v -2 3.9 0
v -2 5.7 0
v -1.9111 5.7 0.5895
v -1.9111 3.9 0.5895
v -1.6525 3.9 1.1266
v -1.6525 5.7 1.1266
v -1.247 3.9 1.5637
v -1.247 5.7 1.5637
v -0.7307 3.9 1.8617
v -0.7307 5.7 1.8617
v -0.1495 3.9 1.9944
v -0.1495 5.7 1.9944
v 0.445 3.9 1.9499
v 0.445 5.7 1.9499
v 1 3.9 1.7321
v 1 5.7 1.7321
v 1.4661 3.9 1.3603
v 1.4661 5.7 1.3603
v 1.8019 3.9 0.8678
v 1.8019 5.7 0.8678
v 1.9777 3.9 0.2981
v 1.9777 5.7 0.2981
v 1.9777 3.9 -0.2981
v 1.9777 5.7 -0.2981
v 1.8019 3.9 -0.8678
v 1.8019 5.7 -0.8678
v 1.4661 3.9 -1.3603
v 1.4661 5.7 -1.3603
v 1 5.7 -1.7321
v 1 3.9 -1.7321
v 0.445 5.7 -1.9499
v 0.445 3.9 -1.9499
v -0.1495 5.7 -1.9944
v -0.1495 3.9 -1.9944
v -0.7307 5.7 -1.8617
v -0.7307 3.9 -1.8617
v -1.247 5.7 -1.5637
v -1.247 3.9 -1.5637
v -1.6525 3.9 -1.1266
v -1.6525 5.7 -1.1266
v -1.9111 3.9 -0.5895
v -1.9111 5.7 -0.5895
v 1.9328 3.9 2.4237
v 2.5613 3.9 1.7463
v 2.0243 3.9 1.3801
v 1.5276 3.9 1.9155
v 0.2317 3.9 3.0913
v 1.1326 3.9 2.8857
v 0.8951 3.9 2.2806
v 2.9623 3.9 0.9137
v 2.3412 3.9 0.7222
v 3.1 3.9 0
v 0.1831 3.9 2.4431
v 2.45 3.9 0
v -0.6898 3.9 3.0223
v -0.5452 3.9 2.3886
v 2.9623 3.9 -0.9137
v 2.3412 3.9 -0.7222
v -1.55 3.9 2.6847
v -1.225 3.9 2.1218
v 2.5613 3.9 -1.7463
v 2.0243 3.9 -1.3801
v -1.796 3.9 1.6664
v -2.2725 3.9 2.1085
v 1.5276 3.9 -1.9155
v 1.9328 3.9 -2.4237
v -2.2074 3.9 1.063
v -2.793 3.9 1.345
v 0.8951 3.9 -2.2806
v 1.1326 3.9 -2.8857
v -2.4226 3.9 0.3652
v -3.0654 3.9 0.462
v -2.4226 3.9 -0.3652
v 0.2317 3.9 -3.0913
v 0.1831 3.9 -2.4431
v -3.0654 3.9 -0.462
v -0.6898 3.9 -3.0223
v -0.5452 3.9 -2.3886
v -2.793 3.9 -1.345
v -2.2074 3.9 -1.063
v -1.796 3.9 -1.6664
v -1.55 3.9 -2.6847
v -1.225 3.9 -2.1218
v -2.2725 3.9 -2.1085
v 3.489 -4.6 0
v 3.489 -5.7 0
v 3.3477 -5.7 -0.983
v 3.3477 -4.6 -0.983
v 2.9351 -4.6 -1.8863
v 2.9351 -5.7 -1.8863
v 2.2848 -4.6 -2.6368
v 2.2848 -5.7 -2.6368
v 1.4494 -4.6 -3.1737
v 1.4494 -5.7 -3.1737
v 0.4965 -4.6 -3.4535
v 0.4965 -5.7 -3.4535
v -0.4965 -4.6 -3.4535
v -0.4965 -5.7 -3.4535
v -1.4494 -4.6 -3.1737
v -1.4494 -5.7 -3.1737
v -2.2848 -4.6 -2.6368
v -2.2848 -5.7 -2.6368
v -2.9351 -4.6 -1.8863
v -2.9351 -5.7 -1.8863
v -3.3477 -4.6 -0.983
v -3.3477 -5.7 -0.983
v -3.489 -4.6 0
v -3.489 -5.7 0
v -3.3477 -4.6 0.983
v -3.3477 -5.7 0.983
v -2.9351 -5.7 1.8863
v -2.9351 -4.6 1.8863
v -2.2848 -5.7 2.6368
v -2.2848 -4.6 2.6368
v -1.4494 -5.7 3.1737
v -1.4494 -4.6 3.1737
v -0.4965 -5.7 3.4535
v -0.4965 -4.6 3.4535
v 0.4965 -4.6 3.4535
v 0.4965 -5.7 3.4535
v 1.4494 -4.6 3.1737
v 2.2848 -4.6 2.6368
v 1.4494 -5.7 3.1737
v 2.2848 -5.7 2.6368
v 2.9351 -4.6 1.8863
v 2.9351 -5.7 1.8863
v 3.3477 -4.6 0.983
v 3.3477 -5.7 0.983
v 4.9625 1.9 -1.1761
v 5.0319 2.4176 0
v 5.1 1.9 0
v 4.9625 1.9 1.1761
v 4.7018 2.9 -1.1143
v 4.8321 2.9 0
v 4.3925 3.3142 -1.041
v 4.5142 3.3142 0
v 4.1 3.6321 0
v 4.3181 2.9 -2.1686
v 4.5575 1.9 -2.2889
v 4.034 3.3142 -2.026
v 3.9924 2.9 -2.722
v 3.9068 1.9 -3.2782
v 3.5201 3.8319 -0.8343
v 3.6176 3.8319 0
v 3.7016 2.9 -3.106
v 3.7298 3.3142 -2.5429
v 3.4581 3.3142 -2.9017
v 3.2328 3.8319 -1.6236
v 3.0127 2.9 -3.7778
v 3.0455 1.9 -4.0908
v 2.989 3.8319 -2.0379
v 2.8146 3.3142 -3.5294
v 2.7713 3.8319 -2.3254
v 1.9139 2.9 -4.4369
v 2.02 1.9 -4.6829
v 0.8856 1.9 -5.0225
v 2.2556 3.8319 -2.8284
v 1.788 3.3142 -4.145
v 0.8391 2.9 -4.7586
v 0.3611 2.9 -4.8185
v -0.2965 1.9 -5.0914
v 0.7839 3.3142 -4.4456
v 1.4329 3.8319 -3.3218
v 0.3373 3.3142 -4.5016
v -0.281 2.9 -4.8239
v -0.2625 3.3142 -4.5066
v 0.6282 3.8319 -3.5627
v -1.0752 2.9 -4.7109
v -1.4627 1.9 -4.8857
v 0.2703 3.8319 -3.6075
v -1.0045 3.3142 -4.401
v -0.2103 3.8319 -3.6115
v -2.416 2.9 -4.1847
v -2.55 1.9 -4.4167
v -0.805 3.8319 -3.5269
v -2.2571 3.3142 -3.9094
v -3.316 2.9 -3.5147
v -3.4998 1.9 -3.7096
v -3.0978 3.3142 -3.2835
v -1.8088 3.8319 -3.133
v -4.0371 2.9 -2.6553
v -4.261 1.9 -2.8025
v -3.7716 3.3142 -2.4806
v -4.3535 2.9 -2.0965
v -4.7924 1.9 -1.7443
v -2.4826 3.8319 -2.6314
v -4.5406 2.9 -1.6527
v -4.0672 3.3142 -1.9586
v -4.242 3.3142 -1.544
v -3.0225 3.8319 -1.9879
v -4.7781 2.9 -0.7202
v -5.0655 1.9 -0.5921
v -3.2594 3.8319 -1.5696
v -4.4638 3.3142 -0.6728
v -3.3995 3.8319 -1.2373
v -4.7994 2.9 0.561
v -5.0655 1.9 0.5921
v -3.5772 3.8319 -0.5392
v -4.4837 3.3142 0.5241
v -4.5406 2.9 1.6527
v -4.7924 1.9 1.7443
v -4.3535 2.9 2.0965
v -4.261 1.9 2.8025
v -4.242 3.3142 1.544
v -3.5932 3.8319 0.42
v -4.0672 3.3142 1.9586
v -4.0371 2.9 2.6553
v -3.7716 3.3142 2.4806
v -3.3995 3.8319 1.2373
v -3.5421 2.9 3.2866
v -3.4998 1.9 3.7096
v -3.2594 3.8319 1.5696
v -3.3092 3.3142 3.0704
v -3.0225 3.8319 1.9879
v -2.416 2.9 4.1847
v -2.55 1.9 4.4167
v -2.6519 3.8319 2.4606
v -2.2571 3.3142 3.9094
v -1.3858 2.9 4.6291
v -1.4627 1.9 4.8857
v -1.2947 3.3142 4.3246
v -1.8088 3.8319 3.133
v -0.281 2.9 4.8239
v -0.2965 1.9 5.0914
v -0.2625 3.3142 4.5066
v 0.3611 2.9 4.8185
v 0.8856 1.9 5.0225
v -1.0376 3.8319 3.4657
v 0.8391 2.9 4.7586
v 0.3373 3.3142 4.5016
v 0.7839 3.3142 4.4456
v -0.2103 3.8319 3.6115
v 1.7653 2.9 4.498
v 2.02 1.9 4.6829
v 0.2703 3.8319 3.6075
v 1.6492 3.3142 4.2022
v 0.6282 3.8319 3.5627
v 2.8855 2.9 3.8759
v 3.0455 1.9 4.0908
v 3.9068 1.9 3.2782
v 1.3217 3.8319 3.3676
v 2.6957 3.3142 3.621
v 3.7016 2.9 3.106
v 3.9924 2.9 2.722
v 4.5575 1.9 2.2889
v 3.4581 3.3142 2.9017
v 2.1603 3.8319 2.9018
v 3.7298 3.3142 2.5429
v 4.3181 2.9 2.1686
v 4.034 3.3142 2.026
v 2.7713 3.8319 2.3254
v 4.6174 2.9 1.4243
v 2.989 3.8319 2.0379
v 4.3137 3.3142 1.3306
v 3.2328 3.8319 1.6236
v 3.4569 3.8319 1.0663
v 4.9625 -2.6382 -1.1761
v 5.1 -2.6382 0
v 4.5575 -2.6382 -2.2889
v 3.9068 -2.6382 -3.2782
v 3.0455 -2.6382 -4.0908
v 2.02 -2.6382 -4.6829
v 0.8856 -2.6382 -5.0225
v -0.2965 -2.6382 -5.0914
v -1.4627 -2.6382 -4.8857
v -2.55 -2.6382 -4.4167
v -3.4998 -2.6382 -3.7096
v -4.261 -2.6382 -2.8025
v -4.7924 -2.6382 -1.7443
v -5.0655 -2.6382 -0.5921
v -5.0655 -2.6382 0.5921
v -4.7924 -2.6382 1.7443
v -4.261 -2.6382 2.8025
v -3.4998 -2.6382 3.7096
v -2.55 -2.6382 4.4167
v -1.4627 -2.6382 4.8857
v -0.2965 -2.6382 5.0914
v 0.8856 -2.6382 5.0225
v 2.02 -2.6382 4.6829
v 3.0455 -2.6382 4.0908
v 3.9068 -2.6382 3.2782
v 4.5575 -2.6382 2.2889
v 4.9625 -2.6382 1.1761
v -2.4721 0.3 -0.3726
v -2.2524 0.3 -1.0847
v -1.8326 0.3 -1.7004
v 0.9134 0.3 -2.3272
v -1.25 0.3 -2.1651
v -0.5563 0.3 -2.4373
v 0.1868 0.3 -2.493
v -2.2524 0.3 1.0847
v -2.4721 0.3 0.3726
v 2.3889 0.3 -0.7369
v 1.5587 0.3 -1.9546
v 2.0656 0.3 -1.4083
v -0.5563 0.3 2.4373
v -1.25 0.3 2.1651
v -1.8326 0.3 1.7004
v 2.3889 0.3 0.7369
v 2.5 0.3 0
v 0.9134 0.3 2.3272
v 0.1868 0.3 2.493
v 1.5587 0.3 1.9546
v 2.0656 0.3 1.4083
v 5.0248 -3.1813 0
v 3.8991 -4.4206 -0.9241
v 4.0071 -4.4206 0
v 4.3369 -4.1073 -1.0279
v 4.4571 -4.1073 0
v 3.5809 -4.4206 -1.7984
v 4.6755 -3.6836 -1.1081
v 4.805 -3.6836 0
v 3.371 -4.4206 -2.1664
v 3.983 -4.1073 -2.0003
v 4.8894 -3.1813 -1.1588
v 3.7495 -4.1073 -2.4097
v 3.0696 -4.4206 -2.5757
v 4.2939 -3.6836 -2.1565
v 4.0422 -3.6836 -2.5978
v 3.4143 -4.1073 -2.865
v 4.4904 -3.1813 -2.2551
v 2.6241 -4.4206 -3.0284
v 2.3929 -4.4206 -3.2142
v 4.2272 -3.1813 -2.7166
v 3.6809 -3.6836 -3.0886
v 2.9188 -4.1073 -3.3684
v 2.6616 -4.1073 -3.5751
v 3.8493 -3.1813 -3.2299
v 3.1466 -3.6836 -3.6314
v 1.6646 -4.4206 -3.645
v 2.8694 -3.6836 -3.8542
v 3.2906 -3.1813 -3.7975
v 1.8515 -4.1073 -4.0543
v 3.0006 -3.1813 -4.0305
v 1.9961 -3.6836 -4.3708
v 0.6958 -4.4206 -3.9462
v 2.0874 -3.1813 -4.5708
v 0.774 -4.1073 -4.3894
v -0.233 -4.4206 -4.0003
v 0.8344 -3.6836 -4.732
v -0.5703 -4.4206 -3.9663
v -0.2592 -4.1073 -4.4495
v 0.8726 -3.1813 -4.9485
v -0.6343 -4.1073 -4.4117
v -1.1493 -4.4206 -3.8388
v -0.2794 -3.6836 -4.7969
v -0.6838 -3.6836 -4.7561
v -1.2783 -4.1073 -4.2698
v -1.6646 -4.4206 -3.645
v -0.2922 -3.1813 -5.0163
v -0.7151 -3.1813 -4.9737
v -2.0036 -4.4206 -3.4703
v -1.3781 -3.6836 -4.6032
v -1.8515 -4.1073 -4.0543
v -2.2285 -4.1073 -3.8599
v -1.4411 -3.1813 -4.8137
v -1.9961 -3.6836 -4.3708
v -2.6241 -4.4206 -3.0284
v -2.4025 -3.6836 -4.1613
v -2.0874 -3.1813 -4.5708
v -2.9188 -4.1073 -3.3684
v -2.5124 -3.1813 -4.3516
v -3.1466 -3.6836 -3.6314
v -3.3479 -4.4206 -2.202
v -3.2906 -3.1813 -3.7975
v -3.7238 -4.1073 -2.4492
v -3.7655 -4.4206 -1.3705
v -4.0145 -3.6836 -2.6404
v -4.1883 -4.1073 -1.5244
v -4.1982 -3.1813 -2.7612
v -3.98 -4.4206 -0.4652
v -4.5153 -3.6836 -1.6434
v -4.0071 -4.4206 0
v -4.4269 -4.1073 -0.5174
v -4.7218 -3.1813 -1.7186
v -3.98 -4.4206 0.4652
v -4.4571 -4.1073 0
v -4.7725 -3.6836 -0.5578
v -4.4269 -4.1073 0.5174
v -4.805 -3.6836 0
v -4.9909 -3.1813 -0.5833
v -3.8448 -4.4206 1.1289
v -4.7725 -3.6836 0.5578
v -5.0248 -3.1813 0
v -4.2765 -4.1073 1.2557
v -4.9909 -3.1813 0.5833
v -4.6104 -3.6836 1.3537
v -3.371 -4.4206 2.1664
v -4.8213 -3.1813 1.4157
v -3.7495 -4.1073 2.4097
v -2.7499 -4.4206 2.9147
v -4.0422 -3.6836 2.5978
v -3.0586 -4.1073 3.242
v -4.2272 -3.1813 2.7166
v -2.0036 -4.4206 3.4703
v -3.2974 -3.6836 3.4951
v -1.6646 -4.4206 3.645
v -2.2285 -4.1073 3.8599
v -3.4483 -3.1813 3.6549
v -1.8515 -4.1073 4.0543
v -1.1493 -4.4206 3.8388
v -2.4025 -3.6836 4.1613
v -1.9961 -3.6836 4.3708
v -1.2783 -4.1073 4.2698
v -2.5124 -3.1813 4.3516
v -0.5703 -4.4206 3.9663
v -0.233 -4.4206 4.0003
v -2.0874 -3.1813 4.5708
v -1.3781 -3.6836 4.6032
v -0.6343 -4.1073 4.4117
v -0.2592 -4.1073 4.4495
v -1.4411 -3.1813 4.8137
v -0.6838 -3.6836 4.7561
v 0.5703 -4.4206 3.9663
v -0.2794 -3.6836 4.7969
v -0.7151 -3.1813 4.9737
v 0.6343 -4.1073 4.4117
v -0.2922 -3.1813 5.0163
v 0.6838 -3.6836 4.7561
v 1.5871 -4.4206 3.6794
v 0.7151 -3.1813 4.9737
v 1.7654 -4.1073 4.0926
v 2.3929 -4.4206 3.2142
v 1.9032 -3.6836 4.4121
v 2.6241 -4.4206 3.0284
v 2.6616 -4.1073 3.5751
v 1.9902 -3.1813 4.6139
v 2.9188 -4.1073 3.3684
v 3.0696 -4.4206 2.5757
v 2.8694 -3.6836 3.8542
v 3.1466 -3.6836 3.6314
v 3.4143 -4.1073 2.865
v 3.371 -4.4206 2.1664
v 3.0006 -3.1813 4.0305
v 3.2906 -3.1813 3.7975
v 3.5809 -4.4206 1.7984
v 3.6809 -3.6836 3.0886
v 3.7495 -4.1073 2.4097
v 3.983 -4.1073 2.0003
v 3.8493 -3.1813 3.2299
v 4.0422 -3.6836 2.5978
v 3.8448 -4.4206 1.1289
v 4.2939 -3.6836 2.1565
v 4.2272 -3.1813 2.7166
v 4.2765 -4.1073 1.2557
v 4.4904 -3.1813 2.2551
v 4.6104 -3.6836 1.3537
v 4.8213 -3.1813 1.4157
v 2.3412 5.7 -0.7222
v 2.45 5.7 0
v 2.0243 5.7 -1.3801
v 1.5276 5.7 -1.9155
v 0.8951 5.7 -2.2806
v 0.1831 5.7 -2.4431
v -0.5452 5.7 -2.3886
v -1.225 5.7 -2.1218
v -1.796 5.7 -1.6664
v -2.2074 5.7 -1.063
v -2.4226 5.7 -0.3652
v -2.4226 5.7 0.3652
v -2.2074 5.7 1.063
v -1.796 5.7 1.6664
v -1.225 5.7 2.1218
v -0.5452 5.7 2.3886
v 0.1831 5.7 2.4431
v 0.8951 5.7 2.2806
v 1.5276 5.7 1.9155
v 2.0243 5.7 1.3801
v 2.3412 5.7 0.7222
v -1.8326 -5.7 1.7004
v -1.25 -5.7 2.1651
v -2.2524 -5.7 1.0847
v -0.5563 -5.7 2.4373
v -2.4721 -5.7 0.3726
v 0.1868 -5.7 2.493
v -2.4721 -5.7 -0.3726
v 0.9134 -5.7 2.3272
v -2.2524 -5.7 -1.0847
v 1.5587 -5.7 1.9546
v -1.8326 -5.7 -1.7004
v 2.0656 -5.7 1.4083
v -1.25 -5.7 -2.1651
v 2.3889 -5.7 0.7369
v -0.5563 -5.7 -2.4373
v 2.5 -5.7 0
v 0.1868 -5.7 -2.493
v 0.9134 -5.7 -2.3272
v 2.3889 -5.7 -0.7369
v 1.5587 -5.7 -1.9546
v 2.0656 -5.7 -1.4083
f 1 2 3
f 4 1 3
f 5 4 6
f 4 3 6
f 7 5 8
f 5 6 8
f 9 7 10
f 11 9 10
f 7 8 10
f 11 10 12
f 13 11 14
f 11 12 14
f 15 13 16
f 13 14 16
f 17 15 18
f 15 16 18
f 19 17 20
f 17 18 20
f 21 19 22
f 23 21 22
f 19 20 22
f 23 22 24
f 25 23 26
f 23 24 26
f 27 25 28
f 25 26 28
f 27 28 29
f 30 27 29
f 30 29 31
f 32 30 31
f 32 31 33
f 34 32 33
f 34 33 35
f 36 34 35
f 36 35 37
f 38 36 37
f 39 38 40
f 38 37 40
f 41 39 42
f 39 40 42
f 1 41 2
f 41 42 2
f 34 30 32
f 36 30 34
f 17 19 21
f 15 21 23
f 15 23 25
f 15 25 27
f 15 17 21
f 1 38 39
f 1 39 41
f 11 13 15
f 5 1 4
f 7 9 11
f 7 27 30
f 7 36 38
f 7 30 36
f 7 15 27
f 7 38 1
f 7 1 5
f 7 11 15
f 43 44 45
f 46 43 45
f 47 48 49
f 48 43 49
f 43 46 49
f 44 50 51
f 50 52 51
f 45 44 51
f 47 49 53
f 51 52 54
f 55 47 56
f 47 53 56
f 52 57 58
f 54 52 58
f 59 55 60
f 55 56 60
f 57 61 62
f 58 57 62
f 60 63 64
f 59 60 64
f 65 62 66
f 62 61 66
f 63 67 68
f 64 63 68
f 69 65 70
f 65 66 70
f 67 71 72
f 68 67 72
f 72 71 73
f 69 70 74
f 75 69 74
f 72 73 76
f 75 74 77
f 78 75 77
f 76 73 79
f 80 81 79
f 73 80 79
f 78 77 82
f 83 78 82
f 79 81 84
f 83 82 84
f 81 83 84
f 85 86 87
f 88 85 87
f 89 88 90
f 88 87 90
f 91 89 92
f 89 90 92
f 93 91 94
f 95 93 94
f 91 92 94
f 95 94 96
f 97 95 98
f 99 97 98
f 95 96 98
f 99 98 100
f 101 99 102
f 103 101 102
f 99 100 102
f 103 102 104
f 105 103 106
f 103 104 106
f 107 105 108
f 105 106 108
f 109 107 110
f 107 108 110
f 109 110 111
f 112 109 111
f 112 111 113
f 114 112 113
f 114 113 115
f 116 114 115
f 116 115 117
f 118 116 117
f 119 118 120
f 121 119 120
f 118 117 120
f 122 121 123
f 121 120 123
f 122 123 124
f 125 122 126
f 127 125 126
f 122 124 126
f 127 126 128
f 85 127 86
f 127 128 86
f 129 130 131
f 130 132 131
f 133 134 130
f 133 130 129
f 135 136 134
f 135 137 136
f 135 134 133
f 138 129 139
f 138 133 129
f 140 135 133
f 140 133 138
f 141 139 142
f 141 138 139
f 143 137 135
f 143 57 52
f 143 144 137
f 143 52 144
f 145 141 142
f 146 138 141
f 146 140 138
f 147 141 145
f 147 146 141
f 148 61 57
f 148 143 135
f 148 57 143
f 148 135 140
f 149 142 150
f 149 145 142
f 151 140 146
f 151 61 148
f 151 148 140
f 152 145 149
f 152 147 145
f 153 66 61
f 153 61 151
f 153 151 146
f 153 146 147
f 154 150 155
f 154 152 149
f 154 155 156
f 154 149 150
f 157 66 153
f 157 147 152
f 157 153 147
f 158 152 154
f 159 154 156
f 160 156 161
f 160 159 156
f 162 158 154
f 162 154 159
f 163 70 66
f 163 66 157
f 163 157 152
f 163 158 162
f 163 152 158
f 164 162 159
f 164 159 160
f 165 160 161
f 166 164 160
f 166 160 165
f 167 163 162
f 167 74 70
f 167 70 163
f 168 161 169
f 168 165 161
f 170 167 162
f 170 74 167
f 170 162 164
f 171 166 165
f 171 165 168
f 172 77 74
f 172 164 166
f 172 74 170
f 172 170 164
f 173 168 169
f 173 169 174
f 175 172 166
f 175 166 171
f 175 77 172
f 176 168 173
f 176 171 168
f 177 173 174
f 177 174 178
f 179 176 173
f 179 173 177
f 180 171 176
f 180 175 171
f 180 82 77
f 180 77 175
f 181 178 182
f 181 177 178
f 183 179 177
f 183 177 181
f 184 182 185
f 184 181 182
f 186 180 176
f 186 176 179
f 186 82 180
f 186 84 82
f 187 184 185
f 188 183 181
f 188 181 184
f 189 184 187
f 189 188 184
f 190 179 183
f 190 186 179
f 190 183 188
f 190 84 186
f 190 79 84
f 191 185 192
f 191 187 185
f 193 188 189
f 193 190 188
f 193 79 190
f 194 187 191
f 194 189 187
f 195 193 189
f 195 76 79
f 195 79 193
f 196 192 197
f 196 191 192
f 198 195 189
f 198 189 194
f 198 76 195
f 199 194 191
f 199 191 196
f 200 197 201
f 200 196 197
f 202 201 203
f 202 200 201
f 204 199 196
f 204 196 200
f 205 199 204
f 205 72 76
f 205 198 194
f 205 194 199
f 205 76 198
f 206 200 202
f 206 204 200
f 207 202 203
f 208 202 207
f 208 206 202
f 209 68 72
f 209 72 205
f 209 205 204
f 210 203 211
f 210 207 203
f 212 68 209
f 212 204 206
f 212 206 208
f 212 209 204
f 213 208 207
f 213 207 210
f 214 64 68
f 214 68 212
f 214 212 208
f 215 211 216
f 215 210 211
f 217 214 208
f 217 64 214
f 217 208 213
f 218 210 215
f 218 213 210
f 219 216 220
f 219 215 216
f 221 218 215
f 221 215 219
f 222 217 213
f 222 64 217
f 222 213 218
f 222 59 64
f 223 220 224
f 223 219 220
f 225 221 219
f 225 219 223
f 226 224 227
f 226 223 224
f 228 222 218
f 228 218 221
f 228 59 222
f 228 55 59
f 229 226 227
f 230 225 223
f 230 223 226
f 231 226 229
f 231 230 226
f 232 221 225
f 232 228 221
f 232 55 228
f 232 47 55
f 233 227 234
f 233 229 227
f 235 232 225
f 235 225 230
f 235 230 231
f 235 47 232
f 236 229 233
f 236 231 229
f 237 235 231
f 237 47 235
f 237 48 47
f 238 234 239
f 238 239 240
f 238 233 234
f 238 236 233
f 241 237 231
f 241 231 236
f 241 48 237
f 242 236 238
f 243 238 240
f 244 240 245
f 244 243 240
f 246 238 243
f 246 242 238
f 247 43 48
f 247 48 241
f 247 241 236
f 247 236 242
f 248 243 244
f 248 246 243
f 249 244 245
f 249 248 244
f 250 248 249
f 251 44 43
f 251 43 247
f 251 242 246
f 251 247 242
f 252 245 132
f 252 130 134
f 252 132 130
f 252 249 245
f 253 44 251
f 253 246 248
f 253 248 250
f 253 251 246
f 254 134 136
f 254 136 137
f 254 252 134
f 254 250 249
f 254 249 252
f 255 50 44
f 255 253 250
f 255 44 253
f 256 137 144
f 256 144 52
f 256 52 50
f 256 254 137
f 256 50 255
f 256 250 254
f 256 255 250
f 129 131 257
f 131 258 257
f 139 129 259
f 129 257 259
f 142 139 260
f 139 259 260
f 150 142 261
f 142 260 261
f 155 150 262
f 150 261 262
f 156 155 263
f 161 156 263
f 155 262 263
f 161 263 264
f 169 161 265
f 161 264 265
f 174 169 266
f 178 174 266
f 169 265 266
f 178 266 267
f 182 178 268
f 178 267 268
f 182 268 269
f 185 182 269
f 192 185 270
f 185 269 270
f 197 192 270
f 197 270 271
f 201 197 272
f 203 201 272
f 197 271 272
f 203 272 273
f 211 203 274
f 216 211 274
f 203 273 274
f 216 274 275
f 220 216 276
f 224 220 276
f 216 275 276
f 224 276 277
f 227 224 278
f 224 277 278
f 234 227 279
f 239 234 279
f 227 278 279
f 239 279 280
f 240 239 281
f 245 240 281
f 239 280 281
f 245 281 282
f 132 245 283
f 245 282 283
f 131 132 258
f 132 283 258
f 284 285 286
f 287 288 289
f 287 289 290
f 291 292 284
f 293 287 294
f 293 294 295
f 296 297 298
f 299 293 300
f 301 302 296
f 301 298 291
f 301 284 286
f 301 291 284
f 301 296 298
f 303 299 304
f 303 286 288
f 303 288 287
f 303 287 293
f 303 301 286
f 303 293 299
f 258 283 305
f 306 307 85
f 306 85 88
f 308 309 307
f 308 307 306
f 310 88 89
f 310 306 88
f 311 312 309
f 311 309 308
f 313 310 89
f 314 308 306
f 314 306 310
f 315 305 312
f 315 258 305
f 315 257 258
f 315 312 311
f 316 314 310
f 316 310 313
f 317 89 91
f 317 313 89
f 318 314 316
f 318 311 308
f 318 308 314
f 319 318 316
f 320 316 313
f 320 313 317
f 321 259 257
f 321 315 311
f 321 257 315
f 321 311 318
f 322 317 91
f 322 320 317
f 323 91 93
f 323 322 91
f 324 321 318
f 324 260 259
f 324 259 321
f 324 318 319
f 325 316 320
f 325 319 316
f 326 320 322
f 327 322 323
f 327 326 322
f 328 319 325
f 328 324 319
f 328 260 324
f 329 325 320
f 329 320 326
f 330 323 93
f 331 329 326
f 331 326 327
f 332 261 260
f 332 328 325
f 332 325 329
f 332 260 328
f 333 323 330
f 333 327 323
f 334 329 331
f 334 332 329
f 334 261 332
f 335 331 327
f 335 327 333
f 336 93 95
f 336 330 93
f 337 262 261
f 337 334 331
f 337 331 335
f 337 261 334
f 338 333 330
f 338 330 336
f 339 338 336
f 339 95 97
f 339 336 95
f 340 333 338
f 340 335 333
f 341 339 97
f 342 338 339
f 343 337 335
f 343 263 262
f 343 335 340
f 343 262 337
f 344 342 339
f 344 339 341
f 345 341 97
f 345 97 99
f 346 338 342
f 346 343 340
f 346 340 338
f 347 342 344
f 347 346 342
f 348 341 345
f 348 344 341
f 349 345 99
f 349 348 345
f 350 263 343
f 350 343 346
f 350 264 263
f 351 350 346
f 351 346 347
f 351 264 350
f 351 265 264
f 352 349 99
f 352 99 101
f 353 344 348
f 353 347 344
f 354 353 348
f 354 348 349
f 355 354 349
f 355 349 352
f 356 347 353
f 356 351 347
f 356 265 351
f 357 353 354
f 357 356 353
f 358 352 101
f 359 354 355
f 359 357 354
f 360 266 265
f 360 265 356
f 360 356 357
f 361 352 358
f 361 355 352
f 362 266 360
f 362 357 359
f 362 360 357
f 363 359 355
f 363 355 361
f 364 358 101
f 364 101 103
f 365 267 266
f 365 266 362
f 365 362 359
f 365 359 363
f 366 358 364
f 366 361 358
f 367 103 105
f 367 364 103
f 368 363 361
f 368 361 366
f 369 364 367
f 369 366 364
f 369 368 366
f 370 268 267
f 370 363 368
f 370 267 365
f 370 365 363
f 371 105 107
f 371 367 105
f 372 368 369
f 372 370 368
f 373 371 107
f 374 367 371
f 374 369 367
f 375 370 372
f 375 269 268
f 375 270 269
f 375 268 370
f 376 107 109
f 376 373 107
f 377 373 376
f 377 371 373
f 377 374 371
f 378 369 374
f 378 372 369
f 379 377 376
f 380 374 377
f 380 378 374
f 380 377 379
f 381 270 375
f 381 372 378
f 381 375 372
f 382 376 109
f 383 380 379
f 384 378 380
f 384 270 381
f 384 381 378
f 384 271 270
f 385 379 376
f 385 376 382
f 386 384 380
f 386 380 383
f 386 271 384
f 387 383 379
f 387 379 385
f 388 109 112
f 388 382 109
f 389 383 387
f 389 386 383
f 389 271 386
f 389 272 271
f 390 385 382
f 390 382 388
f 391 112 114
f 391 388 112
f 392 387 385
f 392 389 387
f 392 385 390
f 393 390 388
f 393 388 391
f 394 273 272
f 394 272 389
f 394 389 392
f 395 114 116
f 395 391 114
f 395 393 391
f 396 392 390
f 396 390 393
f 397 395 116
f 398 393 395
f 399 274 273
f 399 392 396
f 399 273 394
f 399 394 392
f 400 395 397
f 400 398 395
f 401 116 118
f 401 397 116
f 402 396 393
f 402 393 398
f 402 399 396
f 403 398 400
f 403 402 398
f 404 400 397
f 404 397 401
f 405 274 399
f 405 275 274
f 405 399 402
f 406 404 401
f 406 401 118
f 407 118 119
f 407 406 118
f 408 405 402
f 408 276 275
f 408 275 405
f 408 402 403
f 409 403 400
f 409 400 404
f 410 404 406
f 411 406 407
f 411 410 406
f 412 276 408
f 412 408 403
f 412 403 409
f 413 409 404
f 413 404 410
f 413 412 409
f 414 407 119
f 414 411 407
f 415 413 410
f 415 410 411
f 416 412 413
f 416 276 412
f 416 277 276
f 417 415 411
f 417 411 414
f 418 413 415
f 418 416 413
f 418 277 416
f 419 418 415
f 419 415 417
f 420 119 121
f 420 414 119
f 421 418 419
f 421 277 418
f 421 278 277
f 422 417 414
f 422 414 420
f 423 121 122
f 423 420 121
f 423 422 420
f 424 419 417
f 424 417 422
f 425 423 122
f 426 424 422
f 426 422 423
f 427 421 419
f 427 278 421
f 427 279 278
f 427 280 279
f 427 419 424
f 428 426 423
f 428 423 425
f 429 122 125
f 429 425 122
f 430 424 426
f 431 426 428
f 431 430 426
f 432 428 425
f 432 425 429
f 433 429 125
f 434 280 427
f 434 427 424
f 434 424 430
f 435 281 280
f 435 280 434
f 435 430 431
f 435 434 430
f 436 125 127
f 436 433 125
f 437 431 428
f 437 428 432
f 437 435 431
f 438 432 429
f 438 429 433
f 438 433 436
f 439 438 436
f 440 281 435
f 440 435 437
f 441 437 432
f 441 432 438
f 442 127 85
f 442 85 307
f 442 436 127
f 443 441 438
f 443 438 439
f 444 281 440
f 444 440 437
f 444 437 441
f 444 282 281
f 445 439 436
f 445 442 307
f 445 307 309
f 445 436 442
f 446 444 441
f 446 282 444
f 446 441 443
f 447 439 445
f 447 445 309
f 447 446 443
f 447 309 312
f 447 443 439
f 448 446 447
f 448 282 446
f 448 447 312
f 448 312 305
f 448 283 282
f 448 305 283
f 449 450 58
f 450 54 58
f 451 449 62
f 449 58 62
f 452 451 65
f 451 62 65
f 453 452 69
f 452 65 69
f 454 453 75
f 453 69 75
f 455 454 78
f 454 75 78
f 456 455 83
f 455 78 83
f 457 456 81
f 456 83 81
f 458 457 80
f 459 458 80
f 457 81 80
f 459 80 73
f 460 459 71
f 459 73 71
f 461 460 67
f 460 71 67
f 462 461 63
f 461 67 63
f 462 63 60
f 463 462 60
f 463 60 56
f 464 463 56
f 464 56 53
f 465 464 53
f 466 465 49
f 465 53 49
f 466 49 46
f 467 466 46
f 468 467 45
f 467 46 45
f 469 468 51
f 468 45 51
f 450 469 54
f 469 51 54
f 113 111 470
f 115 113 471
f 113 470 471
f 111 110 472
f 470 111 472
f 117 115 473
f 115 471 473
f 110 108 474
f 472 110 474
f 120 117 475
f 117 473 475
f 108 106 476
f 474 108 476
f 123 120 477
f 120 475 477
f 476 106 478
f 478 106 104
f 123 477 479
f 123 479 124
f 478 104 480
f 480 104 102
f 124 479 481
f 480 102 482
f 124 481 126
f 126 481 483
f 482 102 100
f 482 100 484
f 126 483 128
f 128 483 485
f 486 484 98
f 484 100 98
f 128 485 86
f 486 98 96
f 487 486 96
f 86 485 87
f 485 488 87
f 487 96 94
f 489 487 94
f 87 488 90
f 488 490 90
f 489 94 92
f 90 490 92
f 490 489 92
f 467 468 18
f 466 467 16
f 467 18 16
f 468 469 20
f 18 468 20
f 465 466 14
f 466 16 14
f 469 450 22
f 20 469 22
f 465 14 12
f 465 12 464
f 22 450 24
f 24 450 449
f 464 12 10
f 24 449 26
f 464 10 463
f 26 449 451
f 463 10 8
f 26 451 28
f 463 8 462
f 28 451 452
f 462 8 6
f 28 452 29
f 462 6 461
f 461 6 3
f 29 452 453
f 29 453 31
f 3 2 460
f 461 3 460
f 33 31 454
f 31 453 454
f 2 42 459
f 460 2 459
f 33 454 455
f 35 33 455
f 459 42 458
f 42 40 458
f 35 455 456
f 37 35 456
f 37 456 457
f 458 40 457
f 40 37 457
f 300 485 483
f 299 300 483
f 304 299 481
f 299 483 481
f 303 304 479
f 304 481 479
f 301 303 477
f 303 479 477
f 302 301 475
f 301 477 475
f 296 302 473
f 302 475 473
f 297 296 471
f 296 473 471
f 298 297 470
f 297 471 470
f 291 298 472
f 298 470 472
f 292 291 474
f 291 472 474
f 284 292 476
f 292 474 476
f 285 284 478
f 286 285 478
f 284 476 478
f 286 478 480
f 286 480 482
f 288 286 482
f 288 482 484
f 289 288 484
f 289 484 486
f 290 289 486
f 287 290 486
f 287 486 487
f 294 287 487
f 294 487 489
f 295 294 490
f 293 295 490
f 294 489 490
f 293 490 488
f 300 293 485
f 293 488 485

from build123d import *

# Parameters (mm, degrees)
FILLET1_R          = 2
SKETCH3_R          = 2.5
CUT_EXTRUDE1_DEPTH = 6
SKETCH4_R          = 2
CUT_EXTRUDE2_DEPTH = 1.8


with BuildPart() as part:
    # Sketch2 → Revolve2 (revolve)
    with BuildSketch(Plane.XY):
        Polygon((0, -5.7), (0, 5.7), (2.45, 5.7), (2.45, 3.9), (5.1, 3.9), (5.1, -4.6), (3.489000018, -4.6), (3.489000018, -5.7), align=None)
    revolve(axis=Axis((0, -5.7, 0), (0, 1, 0)))

    # Fillet1
    # the kernel refuses this fillet: 2 mm, written as the material it takes off along each edge
    with BuildSketch(Plane(origin=(0, -4.6, 0), x_dir=(1, 0, 0), z_dir=(0, 0, 1))) as fillet1_piece_1:
        with BuildLine():
            CenterArc((3.1, 1.961805033), FILLET1_R, 281.215517004, 78.784482996)
            Line((3.489000018, 0), (3.496780019, -0.039236101))
            ThreePointArc((3.496780019, -0.039236101), (4.294500009, -0.04), (5.1, -0.04))
            Line((5.1, -0.04), (5.14, 0))
            Line((5.14, 0), (5.14, 1.961805033))
            Line((5.14, 1.961805033), (5.1, 1.961805033))
        make_face()
    revolve(axis=Axis((0, -4.6, 0), (0, 1, 0)), mode=Mode.SUBTRACT)
    with BuildSketch(Plane(origin=(0, 3.9, 0), x_dir=(1, 0, 0), z_dir=(0, 0, 1))) as fillet1_piece_2:
        with BuildLine():
            CenterArc((5.1 - FILLET1_R, -FILLET1_R), FILLET1_R, 360, 90)
            Line((5.1, -FILLET1_R), (5.1 + FILLET1_R * 0.02, -FILLET1_R))
            Line((5.1 + FILLET1_R * 0.02, -FILLET1_R), (5.1 + FILLET1_R * 0.02, FILLET1_R * 0.02))
            Line((5.1 + FILLET1_R * 0.02, FILLET1_R * 0.02), (5.1 - FILLET1_R, FILLET1_R * 0.02))
            Line((5.1 - FILLET1_R, FILLET1_R * 0.02), (5.1 - FILLET1_R, 0))
        make_face()
    revolve(axis=Axis((0, 3.9, 0), (0, 1, 0)), mode=Mode.SUBTRACT)

    # Sketch3 → Cut-Extrude1 (cut)
    with BuildSketch(Plane.XZ.offset(5.7)):
        Circle(SKETCH3_R)
    extrude(amount=-CUT_EXTRUDE1_DEPTH, mode=Mode.SUBTRACT)

    # Sketch4 → Cut-Extrude2 (cut)
    with BuildSketch(Plane(origin=(0, 5.7, 0), x_dir=(1, 0, 0), z_dir=(0, 1, 0))):
        with Locations(Location((0, 0, 0), (0, 0, 180))):
            Circle(SKETCH4_R)
    extrude(amount=-CUT_EXTRUDE2_DEPTH, mode=Mode.SUBTRACT)


solid = part.part
